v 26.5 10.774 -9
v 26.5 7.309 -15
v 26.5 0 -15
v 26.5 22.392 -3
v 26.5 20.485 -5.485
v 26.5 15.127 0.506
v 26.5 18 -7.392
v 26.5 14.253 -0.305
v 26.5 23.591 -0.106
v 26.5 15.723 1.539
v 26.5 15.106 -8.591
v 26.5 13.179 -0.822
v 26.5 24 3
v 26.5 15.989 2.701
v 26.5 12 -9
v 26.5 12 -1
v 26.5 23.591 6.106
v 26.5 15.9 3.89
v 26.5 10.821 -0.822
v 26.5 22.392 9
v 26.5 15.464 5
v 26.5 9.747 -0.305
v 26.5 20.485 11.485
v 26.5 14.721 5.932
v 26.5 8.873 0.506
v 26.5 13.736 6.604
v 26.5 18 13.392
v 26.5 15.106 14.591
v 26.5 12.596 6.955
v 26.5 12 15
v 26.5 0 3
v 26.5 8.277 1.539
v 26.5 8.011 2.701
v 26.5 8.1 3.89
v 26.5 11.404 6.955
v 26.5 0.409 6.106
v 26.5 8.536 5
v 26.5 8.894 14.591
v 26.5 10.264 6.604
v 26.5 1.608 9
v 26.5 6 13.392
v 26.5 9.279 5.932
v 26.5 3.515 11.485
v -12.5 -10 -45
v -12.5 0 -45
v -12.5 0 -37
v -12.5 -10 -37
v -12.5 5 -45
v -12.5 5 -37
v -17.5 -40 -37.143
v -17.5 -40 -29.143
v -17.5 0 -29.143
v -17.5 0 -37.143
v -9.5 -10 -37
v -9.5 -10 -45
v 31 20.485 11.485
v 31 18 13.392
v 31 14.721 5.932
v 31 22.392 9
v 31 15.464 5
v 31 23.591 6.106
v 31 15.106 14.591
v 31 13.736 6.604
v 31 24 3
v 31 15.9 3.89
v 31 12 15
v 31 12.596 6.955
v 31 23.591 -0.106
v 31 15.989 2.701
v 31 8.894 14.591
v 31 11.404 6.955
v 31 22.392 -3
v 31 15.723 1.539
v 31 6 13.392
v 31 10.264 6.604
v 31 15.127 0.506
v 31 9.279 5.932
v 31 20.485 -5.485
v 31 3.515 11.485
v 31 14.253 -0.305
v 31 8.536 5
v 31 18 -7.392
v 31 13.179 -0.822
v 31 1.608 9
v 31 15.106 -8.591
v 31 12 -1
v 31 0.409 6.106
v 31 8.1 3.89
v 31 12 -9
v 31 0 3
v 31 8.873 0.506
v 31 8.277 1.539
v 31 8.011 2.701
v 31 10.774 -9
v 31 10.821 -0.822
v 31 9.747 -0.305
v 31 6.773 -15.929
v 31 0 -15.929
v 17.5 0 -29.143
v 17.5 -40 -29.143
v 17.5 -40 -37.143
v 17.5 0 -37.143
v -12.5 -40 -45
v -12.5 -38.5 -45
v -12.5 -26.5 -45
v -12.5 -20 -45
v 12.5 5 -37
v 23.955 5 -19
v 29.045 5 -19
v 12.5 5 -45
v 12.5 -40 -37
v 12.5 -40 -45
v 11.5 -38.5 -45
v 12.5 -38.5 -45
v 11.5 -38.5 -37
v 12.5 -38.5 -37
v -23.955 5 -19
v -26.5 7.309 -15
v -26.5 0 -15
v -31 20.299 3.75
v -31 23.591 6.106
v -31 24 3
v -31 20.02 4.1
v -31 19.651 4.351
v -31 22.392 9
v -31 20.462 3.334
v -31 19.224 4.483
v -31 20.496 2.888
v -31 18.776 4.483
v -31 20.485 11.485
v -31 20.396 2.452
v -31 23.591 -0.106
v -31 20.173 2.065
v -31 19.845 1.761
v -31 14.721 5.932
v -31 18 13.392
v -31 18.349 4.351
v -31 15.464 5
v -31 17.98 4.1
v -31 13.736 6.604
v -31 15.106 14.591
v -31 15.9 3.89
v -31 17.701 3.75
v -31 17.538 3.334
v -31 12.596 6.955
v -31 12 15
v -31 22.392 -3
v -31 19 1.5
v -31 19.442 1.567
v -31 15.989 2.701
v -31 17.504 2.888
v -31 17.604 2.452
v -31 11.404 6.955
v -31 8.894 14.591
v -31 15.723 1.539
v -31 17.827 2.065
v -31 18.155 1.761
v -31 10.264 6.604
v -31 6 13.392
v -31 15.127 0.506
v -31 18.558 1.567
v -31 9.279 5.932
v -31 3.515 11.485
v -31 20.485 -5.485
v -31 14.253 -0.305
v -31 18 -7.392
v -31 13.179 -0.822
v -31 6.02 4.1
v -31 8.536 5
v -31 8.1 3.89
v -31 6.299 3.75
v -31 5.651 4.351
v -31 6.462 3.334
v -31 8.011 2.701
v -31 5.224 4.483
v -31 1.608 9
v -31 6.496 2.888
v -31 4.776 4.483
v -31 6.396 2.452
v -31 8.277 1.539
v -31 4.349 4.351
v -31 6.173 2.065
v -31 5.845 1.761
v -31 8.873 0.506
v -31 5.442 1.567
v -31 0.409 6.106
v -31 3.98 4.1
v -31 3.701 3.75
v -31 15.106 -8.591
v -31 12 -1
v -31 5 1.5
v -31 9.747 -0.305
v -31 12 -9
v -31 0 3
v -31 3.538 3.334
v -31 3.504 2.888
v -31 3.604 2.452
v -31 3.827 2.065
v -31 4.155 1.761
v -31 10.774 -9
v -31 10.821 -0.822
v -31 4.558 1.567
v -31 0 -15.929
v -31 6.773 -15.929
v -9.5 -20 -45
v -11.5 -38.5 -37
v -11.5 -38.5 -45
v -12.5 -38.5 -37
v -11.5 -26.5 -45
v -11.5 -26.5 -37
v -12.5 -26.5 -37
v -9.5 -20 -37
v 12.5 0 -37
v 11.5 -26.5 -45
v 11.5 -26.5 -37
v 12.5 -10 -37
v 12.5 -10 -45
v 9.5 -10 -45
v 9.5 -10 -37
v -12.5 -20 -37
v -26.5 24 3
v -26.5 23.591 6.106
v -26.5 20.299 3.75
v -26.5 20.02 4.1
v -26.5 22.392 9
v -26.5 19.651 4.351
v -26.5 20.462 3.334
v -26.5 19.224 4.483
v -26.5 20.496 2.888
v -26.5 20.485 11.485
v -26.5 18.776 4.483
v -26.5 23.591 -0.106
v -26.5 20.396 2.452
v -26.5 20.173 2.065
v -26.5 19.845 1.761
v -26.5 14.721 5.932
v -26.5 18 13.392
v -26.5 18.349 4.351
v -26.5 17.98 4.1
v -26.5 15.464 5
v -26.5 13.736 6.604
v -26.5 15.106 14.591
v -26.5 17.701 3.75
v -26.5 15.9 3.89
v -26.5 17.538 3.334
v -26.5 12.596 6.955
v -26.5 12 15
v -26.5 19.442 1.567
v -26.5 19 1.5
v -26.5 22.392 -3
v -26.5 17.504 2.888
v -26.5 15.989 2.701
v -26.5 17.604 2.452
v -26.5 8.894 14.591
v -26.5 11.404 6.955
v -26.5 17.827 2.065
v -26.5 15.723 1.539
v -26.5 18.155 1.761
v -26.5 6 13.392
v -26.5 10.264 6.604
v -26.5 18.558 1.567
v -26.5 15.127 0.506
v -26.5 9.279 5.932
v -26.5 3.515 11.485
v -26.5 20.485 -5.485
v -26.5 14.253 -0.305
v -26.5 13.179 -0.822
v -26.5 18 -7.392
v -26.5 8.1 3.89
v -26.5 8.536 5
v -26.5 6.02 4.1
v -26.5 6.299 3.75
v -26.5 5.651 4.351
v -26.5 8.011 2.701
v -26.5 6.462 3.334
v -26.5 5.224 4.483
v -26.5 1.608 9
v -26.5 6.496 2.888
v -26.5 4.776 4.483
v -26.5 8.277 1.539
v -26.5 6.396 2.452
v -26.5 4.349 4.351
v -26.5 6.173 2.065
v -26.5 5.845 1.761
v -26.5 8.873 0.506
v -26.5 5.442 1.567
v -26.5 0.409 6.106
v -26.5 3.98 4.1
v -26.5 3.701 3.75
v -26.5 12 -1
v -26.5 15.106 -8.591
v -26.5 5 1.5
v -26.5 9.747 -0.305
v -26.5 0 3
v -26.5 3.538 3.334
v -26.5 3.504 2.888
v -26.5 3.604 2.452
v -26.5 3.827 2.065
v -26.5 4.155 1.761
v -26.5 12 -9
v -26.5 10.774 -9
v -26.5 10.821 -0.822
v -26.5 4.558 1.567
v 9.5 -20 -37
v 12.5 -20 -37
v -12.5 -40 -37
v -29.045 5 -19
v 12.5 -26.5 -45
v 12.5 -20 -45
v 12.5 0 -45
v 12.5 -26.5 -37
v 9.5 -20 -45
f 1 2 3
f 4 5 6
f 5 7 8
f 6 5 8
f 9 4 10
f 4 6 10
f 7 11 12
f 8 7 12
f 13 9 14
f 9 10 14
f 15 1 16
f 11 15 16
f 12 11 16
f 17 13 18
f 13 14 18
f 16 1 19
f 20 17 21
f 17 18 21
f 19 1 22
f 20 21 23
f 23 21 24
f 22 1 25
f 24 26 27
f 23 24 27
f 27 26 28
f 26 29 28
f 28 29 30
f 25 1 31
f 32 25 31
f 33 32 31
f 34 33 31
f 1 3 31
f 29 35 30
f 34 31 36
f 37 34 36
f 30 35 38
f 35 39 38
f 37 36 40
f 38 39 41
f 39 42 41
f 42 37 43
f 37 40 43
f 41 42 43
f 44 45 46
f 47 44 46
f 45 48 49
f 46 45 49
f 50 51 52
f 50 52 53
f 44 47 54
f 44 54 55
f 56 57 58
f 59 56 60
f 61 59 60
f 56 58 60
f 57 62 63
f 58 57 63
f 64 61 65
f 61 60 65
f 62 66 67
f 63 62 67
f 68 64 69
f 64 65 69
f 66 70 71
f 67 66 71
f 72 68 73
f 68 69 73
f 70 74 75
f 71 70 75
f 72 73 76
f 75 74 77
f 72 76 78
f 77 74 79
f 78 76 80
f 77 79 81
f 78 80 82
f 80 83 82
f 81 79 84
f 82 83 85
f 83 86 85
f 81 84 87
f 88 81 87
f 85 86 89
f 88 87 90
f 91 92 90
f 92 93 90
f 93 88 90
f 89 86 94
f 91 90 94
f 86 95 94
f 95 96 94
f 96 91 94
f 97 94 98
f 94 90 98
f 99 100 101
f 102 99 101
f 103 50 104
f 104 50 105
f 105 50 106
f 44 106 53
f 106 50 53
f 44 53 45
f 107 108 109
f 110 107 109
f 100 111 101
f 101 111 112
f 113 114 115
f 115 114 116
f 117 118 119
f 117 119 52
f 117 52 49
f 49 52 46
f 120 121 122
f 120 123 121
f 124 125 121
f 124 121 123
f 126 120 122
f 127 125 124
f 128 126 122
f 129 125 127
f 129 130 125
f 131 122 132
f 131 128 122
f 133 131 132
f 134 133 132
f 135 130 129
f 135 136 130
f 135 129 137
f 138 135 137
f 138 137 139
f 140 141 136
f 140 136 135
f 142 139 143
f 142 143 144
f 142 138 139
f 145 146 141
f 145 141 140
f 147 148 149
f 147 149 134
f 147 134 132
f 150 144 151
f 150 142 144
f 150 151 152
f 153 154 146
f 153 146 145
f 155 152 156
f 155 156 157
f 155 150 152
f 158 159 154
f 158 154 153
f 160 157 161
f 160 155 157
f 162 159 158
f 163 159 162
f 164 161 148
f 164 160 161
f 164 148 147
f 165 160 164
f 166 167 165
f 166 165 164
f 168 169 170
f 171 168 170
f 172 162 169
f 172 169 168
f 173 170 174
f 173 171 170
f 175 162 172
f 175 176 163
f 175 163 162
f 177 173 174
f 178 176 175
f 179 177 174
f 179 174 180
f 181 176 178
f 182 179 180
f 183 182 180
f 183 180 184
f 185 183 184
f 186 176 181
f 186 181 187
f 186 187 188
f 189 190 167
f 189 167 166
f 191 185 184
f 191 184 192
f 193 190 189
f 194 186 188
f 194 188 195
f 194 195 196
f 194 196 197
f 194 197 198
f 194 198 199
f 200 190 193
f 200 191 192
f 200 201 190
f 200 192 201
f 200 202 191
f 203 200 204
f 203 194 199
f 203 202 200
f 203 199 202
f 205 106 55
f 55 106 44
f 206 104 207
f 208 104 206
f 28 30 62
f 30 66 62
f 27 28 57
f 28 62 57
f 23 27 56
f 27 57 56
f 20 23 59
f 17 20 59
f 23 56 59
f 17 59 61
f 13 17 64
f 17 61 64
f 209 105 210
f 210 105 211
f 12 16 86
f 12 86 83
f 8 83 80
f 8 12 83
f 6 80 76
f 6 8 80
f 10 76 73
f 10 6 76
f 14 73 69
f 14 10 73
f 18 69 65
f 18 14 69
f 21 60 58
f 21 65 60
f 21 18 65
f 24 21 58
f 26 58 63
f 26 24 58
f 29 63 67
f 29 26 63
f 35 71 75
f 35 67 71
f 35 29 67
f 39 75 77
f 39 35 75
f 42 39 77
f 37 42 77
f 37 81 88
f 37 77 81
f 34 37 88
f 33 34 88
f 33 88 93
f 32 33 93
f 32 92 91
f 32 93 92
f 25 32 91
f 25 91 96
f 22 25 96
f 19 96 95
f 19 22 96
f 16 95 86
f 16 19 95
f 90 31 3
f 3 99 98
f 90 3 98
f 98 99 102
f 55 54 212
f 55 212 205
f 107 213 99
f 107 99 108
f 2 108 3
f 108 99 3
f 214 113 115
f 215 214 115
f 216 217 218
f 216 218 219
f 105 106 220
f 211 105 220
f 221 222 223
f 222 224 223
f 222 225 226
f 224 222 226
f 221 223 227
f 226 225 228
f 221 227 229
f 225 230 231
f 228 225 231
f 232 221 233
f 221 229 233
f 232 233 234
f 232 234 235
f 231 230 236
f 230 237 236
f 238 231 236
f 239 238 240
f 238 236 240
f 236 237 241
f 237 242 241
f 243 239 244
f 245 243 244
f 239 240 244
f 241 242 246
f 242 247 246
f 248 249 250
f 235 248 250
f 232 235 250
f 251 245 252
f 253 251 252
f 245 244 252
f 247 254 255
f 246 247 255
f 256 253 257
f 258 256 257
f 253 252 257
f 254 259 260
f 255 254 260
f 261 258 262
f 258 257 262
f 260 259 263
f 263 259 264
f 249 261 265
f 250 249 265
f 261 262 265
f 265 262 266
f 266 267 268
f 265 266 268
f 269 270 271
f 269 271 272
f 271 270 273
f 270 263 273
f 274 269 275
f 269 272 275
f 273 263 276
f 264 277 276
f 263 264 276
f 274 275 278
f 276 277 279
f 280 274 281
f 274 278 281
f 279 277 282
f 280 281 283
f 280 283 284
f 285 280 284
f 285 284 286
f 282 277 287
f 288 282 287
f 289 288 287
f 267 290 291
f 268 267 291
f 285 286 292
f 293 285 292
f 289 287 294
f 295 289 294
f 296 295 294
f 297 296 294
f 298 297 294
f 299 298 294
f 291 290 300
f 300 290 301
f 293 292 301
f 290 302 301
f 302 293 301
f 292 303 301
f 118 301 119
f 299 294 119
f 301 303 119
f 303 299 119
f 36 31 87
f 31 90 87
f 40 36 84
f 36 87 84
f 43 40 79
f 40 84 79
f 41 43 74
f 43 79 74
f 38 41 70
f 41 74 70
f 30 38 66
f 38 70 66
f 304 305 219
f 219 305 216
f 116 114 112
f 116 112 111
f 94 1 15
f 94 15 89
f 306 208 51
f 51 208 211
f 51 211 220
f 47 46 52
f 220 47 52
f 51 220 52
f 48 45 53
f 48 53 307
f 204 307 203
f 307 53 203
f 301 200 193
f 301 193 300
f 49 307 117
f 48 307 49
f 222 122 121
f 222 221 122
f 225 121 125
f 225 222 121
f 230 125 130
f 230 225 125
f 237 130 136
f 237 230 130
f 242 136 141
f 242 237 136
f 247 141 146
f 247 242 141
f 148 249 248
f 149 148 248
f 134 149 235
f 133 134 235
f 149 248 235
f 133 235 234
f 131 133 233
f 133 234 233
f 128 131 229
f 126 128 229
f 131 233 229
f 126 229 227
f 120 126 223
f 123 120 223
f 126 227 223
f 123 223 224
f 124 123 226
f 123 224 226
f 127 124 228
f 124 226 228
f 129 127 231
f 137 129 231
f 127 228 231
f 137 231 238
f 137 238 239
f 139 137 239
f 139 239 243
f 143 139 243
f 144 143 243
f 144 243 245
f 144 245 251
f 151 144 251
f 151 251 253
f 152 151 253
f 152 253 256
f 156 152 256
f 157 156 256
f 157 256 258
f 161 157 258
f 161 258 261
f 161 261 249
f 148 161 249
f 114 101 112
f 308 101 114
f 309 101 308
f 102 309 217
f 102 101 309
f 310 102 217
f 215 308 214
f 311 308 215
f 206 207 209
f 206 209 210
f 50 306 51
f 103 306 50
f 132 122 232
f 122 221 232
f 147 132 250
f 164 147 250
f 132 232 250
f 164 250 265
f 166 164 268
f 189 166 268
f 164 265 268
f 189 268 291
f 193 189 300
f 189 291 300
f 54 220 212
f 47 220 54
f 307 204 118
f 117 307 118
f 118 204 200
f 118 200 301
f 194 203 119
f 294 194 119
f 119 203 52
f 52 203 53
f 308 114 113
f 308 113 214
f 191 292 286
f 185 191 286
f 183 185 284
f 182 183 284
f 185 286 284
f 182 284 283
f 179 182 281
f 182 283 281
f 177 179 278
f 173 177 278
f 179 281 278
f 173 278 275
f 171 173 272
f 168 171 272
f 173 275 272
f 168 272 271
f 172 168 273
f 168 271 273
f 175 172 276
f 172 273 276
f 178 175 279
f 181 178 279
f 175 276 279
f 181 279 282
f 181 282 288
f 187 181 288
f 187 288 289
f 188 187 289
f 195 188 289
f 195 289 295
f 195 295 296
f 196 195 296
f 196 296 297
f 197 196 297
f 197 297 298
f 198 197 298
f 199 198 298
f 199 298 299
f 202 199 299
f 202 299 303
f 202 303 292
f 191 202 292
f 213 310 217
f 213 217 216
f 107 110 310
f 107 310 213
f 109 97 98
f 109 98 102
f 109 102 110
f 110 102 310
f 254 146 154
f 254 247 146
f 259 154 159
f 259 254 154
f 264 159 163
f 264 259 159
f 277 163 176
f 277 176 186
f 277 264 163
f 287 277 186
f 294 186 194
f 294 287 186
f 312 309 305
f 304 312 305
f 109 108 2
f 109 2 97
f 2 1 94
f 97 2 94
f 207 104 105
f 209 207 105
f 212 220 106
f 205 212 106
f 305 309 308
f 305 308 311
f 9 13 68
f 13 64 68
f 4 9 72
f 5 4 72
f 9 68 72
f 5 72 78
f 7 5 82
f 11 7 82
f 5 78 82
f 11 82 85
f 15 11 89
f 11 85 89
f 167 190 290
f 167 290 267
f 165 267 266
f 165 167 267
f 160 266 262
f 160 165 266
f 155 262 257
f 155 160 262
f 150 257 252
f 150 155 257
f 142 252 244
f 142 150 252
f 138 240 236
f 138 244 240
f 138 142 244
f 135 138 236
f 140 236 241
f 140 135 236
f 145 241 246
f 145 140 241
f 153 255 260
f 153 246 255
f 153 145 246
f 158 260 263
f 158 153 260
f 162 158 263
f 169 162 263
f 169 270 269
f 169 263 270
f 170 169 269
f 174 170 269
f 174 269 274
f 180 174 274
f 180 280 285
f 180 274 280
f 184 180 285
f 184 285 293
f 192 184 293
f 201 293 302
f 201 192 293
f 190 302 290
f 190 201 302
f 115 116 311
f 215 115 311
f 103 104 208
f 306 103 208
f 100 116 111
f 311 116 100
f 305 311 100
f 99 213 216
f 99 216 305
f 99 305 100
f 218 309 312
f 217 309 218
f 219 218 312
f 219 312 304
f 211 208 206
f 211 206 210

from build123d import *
from OCP.BRepFilletAPI import BRepFilletAPI_MakeChamfer

# Parameters (mm, degrees)
BOSS_EXTRUDE1_DEPTH     = 5
SKETCH2_W               = 4.5
SKETCH2_H               = 24
BOSS_EXTRUDE2_DEPTH     = 19
CUT_EXTRUDE1_REACH      = 59.853
SKETCH5_R               = 1.7
CUT_EXTRUDE2_REACH      = 73.673
SKETCH6_W               = 14
SKETCH6_H               = 3
CUT_EXTRUDE3_REACH      = 78.859
SKETCH7_R               = 1.5
CUT_EXTRUDE4_DEPTH      = 77.85863647
CUT_EXTRUDE4_DEPTH_BACK = 77.85863647
SKETCH8_R               = 4
FILLET1_R               = 12
CHAMFER2_SIZE           = 10
CHAMFER2_SIZE2          = 5.773502692
CUT_EXTRUDE5_REACH      = 59.853
SKETCH10_R              = 1.7
SKETCH_1_W              = 25
SKETCH_1_H              = 8
CUT_EXTRUDE_1_DEPTH     = 60.682493246
EXTRUDE_2_DEPTH         = 40
SKETCH_5_W              = 8
SKETCH_5_H              = 10
EXTRUDE_3_DEPTH         = 3
SKETCH_4_W              = 8
SKETCH_4_H              = 10
EXTRUDE_4_DEPTH         = 3
SKETCH_7_W              = 8
SKETCH_7_H              = 12
EXTRUDE_5_DEPTH         = 1


with BuildPart() as part:
    # Sketch1 → Boss-Extrude1 (new body)
    with BuildSketch(Plane(origin=(0, 0, 0), x_dir=(1, 0, 0), z_dir=(0, 1, 0))):
        Polygon((-31, 15.928571429), (-31, -15), (-26.5, -15), (-26.5, 15), (-12.5, 37), (12.5, 37), (26.5, 15), (26.5, -15), (31, -15), (31, 15.928571429), (12.5, 45), (-12.5, 45), align=None)
    extrude(amount=BOSS_EXTRUDE1_DEPTH)

    # Sketch2 → Boss-Extrude2 (add)
    with BuildSketch(Plane(origin=(0, 5, 0), x_dir=(1, 0, 0), z_dir=(0, 1, 0))):
        with Locations((-28.75, -3)):
            Rectangle(SKETCH2_W, SKETCH2_H)
        with Locations((28.75, -3)):
            Rectangle(SKETCH2_W, SKETCH2_H)
    extrude(amount=BOSS_EXTRUDE2_DEPTH)

    # Sketch5 → Cut-Extrude1 (cut, up to next)
    with BuildSketch(Plane(origin=(0, 5, 0), x_dir=(1, 0, 0), z_dir=(0, 1, 0)), mode=Mode.PRIVATE) as cut_extrude1_sk1:
        with Locations(Location((0, 41, 0), (0, 0, 270))):
            Circle(SKETCH5_R)
    cut_extrude1_tool1 = extrude(cut_extrude1_sk1.sketch, amount=-CUT_EXTRUDE1_REACH, mode=Mode.PRIVATE) & part.part
    add(cut_extrude1_tool1.solids().sort_by_distance((0, 5, -41))[0], mode=Mode.SUBTRACT)

    # Cut-Extrude2: up to this face of the body (flat: up to its plane)
    cut_extrude2_end = Plane(part.part.faces().sort_by_distance((0, 2.5, -37))[0])
    # Sketch6 → Cut-Extrude2 (cut, up to the picked face)
    with BuildSketch(Plane(origin=(0, 0, -45), x_dir=(-1, 0, 0), z_dir=(0, 0, -1)), mode=Mode.PRIVATE) as cut_extrude2_sk1:
        with Locations((0, 3.5)):
            Rectangle(SKETCH6_W, SKETCH6_H)
    cut_extrude2_tool1 = split(extrude(cut_extrude2_sk1.sketch, amount=-CUT_EXTRUDE2_REACH, mode=Mode.PRIVATE), bisect_by=cut_extrude2_end, keep=Keep.BOTH, mode=Mode.PRIVATE)
    add(cut_extrude2_tool1.solids().sort_by(Axis((0, 3.5, -45), (0, 0, 1)))[0], mode=Mode.SUBTRACT)

    # Sketch7 → Cut-Extrude3 (cut, up to next)
    with BuildSketch(Plane(origin=(-26.5, 0, 0), x_dir=(0, 0, -1), z_dir=(1, 0, 0)), mode=Mode.PRIVATE) as cut_extrude3_sk1:
        with Locations((-3, 19)):
            Circle(SKETCH7_R)
    cut_extrude3_tool1 = extrude(cut_extrude3_sk1.sketch, amount=-CUT_EXTRUDE3_REACH, mode=Mode.PRIVATE) & part.part
    # Sketch7 → Cut-Extrude3 (cut, up to next)
    with BuildSketch(Plane(origin=(-26.5, 0, 0), x_dir=(0, 0, -1), z_dir=(1, 0, 0)), mode=Mode.PRIVATE) as cut_extrude3_sk2:
        with Locations((-3, 5)):
            Circle(SKETCH7_R)
    cut_extrude3_tool2 = extrude(cut_extrude3_sk2.sketch, amount=-CUT_EXTRUDE3_REACH, mode=Mode.PRIVATE) & part.part
    add(cut_extrude3_tool1.solids().sort_by_distance((-26.5, 19, 3))[0], mode=Mode.SUBTRACT)
    add(cut_extrude3_tool2.solids().sort_by_distance((-26.5, 5, 3))[0], mode=Mode.SUBTRACT)

    # Sketch8 → Cut-Extrude4 (cut, two sides: drawn at the far end of the back side and taken through both)
    with BuildSketch(Plane(origin=(-26.5, 0, 0), x_dir=(0, 0, -1), z_dir=(1, 0, 0)).offset(-CUT_EXTRUDE4_DEPTH_BACK)):
        with Locations((-3, 12)):
            Circle(SKETCH8_R)
    extrude(amount=CUT_EXTRUDE4_DEPTH + CUT_EXTRUDE4_DEPTH_BACK, mode=Mode.SUBTRACT)

    # Fillet1
    fillet1_edges = [part.edges().sort_by_distance(p)[0] for p in [
        (28.75, 0, 15),
        (-28.75, 0, 15),
        (-28.75, 24, -9),
        (28.75, 24, -9),
        (28.75, 24, 15),
        (-28.75, 24, 15),
    ]]
    fillet(fillet1_edges, radius=FILLET1_R - 0.0001)  # a hair under: the kernel refuses the full size

    # Chamfer2: one chamfer whose edges measure the first distance from different faces: ONE call of the kernel's chamfer builder (chamfer() names one face for all edges)
    chamfer2_edges_1 = [part.edges().sort_by_distance(p)[0] for p in [
        (-28.75, 5, -9),
    ]]
    chamfer2_side_1 = [part.faces().sort_by_distance(p)[0] for p in [
        (-19.473621736, 5, -28.773341624),
    ]]
    chamfer2_edges_2 = [part.edges().sort_by_distance(p)[0] for p in [
        (28.75, 5, -9),
    ]]
    chamfer2_side_2 = [part.faces().sort_by_distance(p)[0] for p in [
        (19.473621736, 5, -28.773341624),
    ]]
    chamfer2 = BRepFilletAPI_MakeChamfer(part.part.solid().wrapped)
    for e in chamfer2_edges_1:
        chamfer2.Add(CHAMFER2_SIZE, CHAMFER2_SIZE2, e.wrapped, chamfer2_side_1[0].wrapped)  # the first distance lies on this face
    for e in chamfer2_edges_2:
        chamfer2.Add(CHAMFER2_SIZE, CHAMFER2_SIZE2, e.wrapped, chamfer2_side_2[0].wrapped)  # the first distance lies on this face
    add(Compound.cast(chamfer2.Shape()), mode=Mode.REPLACE)

    # Sketch10 → Cut-Extrude5 (cut, up to next)
    with BuildSketch(Plane(origin=(0, 5, 0), x_dir=(1, 0, 0), z_dir=(0, 1, 0)), mode=Mode.PRIVATE) as cut_extrude5_sk1:
        with Locations(Location((-10, 41, 0), (0, 0, 270))):
            Circle(SKETCH10_R)
    cut_extrude5_tool1 = extrude(cut_extrude5_sk1.sketch, amount=-CUT_EXTRUDE5_REACH, mode=Mode.PRIVATE) & part.part
    cut_extrude5 = cut_extrude5_tool1.solids().sort_by_distance((-10, 5, -41))[0]
    add(cut_extrude5, mode=Mode.SUBTRACT)

    # Mirror1: Cut-Extrude5 across plane
    add(cut_extrude5.mirror(Plane(origin=(0, 0, 0), x_dir=(0, 0, 1), z_dir=(1, 0, 0))), mode=Mode.SUBTRACT)

    # 草图1 → 切除-拉伸1 (cut, through all)
    with BuildSketch(Plane.XZ):
        with Locations((0, -41)):
            Rectangle(SKETCH_1_W, SKETCH_1_H)
    extrude(amount=-CUT_EXTRUDE_1_DEPTH, mode=Mode.SUBTRACT)


with BuildPart() as cut_extrude_1_piece_1:
    # of the separate pieces the step leaves, piece 1, a body of its own (cut_extrude_1_pieces)
    add(part.part.solids().sort_by_distance((31, 6.773290113, -15.928571429))[0])



with BuildPart() as cut_extrude_1_piece_2:
    # of the separate pieces the step leaves, piece 2, a body of its own (cut_extrude_1_pieces)
    add(part.part.solids().sort_by_distance((-31, 6.773290113, -15.928571429))[0])


with BuildPart() as cut_extrude_1_piece_1_1:
    add(cut_extrude_1_piece_1.part)

    add(cut_extrude_1_piece_2.part)  # 凸台-拉伸2 merges 切除-拉伸1 piece 2
    # 草图2 → 凸台-拉伸2 (add)
    with BuildSketch(Plane(origin=(0, 0, 0), x_dir=(-1, 0, 0), z_dir=(0, -1, 0))):
        Polygon((-12.5, 37), (-17.5, 29.142857143), (-17.5, 37.142857143), (-12.5, 45), align=None)
        Polygon((12.5, 37), (17.5, 29.142857143), (17.5, 37.142857143), (12.5, 45), align=None)
    extrude(amount=EXTRUDE_2_DEPTH)

    # 草图5 → 凸台-拉伸3 (add)
    with BuildSketch(Plane(origin=(-12.5, 0, 0), x_dir=(0, 0, -1), z_dir=(1, 0, 0))):
        with Locations((41, -15)):
            Rectangle(SKETCH_5_W, SKETCH_5_H)
    extrude(amount=EXTRUDE_3_DEPTH)

    # 草图4 → 凸台-拉伸4 (add)
    with BuildSketch(Plane.ZY.offset(-12.5)):
        with Locations((-41, -15)):
            Rectangle(SKETCH_4_W, SKETCH_4_H)
    extrude(amount=EXTRUDE_4_DEPTH)

    # 草图7 → 凸台-拉伸5 (add)
    with BuildSketch(Plane.ZY.offset(-12.5)):
        with Locations((-41, -32.5)):
            Rectangle(SKETCH_7_W, SKETCH_7_H)
    extrude_5 = extrude(amount=EXTRUDE_5_DEPTH)

    # 镜向1: 凸台-拉伸5 across plane
    add(extrude_5.mirror(Plane(origin=(0, 0, 0), x_dir=(0, 0, 1), z_dir=(1, 0, 0))))


solid = cut_extrude_1_piece_1_1.part
